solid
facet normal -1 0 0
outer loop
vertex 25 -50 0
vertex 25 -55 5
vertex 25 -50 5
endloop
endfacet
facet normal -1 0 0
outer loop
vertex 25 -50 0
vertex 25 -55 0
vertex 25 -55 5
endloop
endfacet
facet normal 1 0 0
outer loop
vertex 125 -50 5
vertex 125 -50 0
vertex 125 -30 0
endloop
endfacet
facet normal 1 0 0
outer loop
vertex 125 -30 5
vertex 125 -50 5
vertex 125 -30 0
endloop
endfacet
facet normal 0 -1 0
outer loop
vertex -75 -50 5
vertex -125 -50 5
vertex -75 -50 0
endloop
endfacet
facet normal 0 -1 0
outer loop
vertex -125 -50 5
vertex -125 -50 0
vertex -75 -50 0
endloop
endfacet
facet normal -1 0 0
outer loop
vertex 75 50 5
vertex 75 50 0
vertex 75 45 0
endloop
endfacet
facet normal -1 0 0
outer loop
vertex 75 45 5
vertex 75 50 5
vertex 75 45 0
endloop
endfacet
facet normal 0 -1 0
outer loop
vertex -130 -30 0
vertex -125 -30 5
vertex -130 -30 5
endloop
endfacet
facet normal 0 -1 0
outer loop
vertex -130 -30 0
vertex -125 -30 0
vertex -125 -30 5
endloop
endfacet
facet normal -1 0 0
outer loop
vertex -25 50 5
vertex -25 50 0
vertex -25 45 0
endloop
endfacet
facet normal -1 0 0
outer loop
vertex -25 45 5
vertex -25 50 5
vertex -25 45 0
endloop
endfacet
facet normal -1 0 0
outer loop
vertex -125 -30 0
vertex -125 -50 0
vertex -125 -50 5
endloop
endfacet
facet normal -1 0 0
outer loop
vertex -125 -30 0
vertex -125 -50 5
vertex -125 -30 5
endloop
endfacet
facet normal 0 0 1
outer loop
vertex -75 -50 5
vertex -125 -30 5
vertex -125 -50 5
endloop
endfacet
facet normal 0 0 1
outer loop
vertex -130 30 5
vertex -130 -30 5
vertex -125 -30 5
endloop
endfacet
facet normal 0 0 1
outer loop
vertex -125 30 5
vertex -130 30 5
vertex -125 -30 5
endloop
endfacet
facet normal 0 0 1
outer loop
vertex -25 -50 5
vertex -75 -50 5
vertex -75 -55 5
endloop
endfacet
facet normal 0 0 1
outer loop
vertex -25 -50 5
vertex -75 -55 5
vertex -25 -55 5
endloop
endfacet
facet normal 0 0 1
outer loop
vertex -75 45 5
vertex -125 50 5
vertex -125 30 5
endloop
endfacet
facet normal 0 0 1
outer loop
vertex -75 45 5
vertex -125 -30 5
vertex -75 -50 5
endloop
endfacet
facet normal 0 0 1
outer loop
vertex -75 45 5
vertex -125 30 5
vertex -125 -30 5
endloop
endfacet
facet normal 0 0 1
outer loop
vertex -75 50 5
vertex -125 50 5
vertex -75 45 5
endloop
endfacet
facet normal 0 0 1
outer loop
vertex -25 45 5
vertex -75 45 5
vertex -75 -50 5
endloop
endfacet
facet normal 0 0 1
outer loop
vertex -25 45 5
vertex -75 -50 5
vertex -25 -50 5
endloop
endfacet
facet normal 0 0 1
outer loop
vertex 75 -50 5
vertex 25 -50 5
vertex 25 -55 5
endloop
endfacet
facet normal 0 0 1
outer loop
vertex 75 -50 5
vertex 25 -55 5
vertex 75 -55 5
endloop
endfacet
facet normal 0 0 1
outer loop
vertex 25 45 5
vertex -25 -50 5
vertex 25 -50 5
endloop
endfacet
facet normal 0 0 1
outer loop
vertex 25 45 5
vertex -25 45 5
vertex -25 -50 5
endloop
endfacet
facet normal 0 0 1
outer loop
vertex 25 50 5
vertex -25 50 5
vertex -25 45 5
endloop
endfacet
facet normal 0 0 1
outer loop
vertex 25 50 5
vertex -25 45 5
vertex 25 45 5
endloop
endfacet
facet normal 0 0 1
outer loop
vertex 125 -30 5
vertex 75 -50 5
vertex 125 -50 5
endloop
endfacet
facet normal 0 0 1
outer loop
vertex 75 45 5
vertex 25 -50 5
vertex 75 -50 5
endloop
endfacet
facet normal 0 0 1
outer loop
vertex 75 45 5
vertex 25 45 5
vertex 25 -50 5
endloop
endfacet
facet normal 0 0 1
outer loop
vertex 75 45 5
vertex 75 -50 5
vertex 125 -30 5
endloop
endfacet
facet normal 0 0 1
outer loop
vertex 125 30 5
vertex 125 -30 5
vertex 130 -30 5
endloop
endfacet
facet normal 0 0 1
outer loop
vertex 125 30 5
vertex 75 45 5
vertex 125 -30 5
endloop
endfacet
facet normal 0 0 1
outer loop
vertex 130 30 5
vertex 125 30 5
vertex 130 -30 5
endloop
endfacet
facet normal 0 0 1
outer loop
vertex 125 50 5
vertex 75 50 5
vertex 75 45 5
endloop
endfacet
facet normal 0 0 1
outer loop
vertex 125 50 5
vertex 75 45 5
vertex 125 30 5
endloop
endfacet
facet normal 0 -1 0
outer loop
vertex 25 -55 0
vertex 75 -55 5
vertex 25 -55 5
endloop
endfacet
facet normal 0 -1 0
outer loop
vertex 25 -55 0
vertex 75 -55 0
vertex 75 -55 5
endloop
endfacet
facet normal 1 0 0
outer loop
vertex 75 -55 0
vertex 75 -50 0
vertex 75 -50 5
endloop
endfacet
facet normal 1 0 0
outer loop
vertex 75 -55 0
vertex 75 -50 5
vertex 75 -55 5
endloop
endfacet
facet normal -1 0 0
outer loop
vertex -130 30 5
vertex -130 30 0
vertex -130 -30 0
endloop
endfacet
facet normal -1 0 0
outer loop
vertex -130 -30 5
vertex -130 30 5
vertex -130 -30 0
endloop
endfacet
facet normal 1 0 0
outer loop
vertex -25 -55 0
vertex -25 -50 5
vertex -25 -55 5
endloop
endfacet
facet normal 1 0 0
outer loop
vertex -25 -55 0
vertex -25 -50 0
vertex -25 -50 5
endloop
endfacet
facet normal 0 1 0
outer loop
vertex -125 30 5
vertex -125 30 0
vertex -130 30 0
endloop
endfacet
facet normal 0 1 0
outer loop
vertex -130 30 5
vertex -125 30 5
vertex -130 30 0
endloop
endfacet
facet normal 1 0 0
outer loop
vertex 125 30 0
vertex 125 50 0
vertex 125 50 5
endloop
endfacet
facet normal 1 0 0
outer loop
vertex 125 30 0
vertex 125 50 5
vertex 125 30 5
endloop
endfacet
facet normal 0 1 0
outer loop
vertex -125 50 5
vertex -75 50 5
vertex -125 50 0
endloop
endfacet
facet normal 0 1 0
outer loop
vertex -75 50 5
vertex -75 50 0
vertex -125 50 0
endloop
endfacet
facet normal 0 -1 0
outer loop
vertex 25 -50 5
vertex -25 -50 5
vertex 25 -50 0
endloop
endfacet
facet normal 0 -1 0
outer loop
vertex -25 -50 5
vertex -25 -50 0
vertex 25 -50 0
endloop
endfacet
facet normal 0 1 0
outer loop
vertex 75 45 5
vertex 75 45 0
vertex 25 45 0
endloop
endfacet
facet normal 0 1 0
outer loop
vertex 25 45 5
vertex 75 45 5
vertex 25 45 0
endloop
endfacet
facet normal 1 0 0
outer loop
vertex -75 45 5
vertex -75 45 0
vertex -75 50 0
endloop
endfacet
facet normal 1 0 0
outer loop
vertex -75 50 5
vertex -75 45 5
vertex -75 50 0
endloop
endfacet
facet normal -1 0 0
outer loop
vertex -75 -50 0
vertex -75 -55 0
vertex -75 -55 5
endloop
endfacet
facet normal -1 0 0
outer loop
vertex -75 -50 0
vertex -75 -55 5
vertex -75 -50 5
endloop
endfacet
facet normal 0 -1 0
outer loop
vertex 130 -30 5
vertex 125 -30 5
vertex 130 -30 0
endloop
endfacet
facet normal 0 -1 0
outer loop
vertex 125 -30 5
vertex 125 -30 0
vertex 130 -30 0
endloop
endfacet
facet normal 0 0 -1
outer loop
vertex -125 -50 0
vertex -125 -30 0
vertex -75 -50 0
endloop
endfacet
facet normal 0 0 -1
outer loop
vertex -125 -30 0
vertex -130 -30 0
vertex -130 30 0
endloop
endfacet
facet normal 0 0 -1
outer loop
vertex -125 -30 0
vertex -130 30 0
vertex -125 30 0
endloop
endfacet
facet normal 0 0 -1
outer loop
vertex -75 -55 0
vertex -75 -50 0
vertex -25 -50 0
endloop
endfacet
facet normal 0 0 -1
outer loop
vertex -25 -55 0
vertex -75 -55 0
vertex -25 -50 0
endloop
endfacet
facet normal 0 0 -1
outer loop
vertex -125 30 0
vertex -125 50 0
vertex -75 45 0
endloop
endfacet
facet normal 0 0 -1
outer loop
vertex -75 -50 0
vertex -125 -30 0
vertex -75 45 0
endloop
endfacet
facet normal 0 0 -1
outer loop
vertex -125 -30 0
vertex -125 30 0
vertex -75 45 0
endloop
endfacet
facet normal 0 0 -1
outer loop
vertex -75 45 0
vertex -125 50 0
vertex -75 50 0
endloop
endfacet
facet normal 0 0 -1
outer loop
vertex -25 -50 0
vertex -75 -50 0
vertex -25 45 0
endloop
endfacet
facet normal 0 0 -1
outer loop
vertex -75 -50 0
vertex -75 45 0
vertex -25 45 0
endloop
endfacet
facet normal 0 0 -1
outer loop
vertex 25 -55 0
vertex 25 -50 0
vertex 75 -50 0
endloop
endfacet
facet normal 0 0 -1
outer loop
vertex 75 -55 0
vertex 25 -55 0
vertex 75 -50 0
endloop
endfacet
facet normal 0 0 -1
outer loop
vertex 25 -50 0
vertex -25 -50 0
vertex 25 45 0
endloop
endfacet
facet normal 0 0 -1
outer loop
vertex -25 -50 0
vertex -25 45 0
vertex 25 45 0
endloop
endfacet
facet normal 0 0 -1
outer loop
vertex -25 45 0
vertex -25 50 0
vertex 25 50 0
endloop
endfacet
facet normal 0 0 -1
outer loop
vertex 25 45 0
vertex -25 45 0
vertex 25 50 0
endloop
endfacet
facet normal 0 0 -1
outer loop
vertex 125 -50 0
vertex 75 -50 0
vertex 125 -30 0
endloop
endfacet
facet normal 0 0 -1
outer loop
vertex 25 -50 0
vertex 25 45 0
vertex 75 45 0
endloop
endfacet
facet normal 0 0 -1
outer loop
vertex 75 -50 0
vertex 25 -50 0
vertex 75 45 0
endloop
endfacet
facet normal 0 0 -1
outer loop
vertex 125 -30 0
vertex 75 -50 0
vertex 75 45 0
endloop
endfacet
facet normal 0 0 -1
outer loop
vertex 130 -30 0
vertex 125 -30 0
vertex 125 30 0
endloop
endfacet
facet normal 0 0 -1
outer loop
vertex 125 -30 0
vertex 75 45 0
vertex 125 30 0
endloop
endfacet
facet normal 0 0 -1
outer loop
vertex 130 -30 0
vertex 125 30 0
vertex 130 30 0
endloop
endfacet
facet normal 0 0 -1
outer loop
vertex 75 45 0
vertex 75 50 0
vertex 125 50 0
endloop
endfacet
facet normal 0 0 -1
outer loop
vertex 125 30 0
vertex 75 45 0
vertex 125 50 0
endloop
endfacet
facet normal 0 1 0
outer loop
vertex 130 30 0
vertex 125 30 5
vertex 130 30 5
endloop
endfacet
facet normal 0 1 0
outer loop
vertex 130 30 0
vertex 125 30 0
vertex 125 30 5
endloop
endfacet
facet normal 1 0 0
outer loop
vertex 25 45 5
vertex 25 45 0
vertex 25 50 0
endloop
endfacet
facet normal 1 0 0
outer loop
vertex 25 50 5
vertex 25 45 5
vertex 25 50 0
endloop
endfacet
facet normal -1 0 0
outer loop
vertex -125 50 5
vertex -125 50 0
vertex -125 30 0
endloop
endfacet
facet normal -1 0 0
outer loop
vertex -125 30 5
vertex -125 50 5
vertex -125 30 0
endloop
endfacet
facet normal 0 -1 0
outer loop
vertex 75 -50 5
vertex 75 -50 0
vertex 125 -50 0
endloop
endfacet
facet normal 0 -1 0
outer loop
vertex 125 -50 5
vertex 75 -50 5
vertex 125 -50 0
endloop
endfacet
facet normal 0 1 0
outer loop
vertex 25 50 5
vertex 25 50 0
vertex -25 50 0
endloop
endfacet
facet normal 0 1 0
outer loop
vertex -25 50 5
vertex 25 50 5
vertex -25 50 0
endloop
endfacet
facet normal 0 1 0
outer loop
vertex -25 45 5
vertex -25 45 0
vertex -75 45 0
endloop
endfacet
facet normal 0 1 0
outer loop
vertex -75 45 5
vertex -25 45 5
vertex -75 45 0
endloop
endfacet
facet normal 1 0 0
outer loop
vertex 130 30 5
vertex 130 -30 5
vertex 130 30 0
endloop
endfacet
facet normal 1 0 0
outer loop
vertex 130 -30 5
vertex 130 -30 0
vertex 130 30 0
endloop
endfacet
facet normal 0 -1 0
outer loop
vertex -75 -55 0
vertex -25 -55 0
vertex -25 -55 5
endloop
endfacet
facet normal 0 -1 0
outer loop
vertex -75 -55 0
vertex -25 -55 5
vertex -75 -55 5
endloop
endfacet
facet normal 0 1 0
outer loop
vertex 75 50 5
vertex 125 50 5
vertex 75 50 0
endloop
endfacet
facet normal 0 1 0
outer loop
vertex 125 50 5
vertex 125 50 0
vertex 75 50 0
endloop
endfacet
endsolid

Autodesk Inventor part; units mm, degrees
ref_plane "YZ Plane" through (0, 0, 0) normal (1, 0, 0) x (0, 1, 0)
ref_plane "XZ Plane" through (0, 0, 0) normal (0, 1, 0) x (-1, 0, 0)
ref_plane "XY Plane" through (0, 0, 0) normal (0, 0, 1) x (1, 0, 0)
sketch "Sketch1" plane through (0, 0, 0) normal (0, 0, 1) x (1, 0, 0)
  line L0 (-130, -50) -> (130, -50)
  line L1 (130, -50) -> (130, 50)
  line L2 (130, 50) -> (-130, 50)
  line L3 (-130, 50) -> (-130, -50)
  line L4 (-130, -50) -> (130, 50) construction
  line L5 (130, -50) -> (-130, 50) construction
  line L6 (-75, -50) -> (-25, -50)
  line L7 (-25, -50) -> (-25, -55)
  line L8 (-25, -55) -> (-75, -55)
  line L9 (-75, -55) -> (-75, -50)
  line L10 (25, -50) -> (75, -50)
  line L11 (75, -50) -> (75, -55)
  line L12 (75, -55) -> (25, -55)
  line L13 (25, -55) -> (25, -50)
  line L14 (130, 50) -> (125, 50)
  line L15 (125, 50) -> (125, 30)
  line L16 (125, 30) -> (130, 30)
  line L17 (130, 30) -> (130, 50)
  line L18 (130, -50) -> (125, -50)
  line L19 (125, -50) -> (125, -30)
  line L20 (125, -30) -> (130, -30)
  line L21 (130, -30) -> (130, -50)
  line L22 (0, 50) -> (0, -50) construction
  line L23 (-125, 50) -> (-125, 30)
  line L24 (-125, 30) -> (-130, 30)
  line L25 (-125, -50) -> (-125, -30)
  line L26 (-125, -30) -> (-130, -30)
  line L27 (-75, 50) -> (-25, 50)
  line L28 (-25, 50) -> (-25, 45)
  line L29 (-25, 45) -> (-75, 45)
  line L30 (-75, 45) -> (-75, 50)
  line L31 (25, 50) -> (75, 50)
  line L32 (75, 50) -> (75, 45)
  line L33 (75, 45) -> (25, 45)
  line L34 (25, 45) -> (25, 50)
  point P0 (0, 0)
  point P1 (-75, -52.5)
  point P2 (-25, -50)
  point P3 (75, -50)
  point P4 (-125, -50)
  point P5 (130, -30)
  point P6 (130, 30)
  point P7 (125, 50)
  point P8 (-125, 50)
  point P9 (-130, 30)
  point P10 (75, 50)
  point P11 (-25, 50)
  dimension "d0" = 260
  dimension "d1" = 100
  dimension "d2" = 50
  dimension "d3" = 50
  dimension "d4" = 50
  dimension "d5" = 55
  dimension "d6" = 5
  dimension "d10" = 20
  dimension "d12" = 5
  dimension "d13" = 50
  dimension "d14" = 50
  dimension "d15" = 5
  dimension "d16" = 20
extrude "Extrusion1" add sketch "Sketch1" along normal blind 5 contours L25 L26 L3 L24 L23 L2 L30 L29 L28 L34 L33 L32 L15 L16 L1 L20 L19 L0 | L0 L7 L8 L9 | L0 L11 L12 L13
equation "\"BendRadius\" = Thickness"
equation "\"BendReliefWidth\" = Thickness"
equation "\"BendReliefDepth\" = 0.5 * Thickness"
equation "\"CornerReliefSize\" = 4 * Thickness"
equation "\"MinimumRemnant\" = 2 * Thickness"
equation "\"TransitionRadius\" = BendRadius"
equation "\"JacobiRadiusSize\" = BendRadius"
equation "\"GapSize\" = Thickness"
equation "\"Thickness\" = 3.048"
properties part number "Lat1(2)" material "Wood (Cherry)"
